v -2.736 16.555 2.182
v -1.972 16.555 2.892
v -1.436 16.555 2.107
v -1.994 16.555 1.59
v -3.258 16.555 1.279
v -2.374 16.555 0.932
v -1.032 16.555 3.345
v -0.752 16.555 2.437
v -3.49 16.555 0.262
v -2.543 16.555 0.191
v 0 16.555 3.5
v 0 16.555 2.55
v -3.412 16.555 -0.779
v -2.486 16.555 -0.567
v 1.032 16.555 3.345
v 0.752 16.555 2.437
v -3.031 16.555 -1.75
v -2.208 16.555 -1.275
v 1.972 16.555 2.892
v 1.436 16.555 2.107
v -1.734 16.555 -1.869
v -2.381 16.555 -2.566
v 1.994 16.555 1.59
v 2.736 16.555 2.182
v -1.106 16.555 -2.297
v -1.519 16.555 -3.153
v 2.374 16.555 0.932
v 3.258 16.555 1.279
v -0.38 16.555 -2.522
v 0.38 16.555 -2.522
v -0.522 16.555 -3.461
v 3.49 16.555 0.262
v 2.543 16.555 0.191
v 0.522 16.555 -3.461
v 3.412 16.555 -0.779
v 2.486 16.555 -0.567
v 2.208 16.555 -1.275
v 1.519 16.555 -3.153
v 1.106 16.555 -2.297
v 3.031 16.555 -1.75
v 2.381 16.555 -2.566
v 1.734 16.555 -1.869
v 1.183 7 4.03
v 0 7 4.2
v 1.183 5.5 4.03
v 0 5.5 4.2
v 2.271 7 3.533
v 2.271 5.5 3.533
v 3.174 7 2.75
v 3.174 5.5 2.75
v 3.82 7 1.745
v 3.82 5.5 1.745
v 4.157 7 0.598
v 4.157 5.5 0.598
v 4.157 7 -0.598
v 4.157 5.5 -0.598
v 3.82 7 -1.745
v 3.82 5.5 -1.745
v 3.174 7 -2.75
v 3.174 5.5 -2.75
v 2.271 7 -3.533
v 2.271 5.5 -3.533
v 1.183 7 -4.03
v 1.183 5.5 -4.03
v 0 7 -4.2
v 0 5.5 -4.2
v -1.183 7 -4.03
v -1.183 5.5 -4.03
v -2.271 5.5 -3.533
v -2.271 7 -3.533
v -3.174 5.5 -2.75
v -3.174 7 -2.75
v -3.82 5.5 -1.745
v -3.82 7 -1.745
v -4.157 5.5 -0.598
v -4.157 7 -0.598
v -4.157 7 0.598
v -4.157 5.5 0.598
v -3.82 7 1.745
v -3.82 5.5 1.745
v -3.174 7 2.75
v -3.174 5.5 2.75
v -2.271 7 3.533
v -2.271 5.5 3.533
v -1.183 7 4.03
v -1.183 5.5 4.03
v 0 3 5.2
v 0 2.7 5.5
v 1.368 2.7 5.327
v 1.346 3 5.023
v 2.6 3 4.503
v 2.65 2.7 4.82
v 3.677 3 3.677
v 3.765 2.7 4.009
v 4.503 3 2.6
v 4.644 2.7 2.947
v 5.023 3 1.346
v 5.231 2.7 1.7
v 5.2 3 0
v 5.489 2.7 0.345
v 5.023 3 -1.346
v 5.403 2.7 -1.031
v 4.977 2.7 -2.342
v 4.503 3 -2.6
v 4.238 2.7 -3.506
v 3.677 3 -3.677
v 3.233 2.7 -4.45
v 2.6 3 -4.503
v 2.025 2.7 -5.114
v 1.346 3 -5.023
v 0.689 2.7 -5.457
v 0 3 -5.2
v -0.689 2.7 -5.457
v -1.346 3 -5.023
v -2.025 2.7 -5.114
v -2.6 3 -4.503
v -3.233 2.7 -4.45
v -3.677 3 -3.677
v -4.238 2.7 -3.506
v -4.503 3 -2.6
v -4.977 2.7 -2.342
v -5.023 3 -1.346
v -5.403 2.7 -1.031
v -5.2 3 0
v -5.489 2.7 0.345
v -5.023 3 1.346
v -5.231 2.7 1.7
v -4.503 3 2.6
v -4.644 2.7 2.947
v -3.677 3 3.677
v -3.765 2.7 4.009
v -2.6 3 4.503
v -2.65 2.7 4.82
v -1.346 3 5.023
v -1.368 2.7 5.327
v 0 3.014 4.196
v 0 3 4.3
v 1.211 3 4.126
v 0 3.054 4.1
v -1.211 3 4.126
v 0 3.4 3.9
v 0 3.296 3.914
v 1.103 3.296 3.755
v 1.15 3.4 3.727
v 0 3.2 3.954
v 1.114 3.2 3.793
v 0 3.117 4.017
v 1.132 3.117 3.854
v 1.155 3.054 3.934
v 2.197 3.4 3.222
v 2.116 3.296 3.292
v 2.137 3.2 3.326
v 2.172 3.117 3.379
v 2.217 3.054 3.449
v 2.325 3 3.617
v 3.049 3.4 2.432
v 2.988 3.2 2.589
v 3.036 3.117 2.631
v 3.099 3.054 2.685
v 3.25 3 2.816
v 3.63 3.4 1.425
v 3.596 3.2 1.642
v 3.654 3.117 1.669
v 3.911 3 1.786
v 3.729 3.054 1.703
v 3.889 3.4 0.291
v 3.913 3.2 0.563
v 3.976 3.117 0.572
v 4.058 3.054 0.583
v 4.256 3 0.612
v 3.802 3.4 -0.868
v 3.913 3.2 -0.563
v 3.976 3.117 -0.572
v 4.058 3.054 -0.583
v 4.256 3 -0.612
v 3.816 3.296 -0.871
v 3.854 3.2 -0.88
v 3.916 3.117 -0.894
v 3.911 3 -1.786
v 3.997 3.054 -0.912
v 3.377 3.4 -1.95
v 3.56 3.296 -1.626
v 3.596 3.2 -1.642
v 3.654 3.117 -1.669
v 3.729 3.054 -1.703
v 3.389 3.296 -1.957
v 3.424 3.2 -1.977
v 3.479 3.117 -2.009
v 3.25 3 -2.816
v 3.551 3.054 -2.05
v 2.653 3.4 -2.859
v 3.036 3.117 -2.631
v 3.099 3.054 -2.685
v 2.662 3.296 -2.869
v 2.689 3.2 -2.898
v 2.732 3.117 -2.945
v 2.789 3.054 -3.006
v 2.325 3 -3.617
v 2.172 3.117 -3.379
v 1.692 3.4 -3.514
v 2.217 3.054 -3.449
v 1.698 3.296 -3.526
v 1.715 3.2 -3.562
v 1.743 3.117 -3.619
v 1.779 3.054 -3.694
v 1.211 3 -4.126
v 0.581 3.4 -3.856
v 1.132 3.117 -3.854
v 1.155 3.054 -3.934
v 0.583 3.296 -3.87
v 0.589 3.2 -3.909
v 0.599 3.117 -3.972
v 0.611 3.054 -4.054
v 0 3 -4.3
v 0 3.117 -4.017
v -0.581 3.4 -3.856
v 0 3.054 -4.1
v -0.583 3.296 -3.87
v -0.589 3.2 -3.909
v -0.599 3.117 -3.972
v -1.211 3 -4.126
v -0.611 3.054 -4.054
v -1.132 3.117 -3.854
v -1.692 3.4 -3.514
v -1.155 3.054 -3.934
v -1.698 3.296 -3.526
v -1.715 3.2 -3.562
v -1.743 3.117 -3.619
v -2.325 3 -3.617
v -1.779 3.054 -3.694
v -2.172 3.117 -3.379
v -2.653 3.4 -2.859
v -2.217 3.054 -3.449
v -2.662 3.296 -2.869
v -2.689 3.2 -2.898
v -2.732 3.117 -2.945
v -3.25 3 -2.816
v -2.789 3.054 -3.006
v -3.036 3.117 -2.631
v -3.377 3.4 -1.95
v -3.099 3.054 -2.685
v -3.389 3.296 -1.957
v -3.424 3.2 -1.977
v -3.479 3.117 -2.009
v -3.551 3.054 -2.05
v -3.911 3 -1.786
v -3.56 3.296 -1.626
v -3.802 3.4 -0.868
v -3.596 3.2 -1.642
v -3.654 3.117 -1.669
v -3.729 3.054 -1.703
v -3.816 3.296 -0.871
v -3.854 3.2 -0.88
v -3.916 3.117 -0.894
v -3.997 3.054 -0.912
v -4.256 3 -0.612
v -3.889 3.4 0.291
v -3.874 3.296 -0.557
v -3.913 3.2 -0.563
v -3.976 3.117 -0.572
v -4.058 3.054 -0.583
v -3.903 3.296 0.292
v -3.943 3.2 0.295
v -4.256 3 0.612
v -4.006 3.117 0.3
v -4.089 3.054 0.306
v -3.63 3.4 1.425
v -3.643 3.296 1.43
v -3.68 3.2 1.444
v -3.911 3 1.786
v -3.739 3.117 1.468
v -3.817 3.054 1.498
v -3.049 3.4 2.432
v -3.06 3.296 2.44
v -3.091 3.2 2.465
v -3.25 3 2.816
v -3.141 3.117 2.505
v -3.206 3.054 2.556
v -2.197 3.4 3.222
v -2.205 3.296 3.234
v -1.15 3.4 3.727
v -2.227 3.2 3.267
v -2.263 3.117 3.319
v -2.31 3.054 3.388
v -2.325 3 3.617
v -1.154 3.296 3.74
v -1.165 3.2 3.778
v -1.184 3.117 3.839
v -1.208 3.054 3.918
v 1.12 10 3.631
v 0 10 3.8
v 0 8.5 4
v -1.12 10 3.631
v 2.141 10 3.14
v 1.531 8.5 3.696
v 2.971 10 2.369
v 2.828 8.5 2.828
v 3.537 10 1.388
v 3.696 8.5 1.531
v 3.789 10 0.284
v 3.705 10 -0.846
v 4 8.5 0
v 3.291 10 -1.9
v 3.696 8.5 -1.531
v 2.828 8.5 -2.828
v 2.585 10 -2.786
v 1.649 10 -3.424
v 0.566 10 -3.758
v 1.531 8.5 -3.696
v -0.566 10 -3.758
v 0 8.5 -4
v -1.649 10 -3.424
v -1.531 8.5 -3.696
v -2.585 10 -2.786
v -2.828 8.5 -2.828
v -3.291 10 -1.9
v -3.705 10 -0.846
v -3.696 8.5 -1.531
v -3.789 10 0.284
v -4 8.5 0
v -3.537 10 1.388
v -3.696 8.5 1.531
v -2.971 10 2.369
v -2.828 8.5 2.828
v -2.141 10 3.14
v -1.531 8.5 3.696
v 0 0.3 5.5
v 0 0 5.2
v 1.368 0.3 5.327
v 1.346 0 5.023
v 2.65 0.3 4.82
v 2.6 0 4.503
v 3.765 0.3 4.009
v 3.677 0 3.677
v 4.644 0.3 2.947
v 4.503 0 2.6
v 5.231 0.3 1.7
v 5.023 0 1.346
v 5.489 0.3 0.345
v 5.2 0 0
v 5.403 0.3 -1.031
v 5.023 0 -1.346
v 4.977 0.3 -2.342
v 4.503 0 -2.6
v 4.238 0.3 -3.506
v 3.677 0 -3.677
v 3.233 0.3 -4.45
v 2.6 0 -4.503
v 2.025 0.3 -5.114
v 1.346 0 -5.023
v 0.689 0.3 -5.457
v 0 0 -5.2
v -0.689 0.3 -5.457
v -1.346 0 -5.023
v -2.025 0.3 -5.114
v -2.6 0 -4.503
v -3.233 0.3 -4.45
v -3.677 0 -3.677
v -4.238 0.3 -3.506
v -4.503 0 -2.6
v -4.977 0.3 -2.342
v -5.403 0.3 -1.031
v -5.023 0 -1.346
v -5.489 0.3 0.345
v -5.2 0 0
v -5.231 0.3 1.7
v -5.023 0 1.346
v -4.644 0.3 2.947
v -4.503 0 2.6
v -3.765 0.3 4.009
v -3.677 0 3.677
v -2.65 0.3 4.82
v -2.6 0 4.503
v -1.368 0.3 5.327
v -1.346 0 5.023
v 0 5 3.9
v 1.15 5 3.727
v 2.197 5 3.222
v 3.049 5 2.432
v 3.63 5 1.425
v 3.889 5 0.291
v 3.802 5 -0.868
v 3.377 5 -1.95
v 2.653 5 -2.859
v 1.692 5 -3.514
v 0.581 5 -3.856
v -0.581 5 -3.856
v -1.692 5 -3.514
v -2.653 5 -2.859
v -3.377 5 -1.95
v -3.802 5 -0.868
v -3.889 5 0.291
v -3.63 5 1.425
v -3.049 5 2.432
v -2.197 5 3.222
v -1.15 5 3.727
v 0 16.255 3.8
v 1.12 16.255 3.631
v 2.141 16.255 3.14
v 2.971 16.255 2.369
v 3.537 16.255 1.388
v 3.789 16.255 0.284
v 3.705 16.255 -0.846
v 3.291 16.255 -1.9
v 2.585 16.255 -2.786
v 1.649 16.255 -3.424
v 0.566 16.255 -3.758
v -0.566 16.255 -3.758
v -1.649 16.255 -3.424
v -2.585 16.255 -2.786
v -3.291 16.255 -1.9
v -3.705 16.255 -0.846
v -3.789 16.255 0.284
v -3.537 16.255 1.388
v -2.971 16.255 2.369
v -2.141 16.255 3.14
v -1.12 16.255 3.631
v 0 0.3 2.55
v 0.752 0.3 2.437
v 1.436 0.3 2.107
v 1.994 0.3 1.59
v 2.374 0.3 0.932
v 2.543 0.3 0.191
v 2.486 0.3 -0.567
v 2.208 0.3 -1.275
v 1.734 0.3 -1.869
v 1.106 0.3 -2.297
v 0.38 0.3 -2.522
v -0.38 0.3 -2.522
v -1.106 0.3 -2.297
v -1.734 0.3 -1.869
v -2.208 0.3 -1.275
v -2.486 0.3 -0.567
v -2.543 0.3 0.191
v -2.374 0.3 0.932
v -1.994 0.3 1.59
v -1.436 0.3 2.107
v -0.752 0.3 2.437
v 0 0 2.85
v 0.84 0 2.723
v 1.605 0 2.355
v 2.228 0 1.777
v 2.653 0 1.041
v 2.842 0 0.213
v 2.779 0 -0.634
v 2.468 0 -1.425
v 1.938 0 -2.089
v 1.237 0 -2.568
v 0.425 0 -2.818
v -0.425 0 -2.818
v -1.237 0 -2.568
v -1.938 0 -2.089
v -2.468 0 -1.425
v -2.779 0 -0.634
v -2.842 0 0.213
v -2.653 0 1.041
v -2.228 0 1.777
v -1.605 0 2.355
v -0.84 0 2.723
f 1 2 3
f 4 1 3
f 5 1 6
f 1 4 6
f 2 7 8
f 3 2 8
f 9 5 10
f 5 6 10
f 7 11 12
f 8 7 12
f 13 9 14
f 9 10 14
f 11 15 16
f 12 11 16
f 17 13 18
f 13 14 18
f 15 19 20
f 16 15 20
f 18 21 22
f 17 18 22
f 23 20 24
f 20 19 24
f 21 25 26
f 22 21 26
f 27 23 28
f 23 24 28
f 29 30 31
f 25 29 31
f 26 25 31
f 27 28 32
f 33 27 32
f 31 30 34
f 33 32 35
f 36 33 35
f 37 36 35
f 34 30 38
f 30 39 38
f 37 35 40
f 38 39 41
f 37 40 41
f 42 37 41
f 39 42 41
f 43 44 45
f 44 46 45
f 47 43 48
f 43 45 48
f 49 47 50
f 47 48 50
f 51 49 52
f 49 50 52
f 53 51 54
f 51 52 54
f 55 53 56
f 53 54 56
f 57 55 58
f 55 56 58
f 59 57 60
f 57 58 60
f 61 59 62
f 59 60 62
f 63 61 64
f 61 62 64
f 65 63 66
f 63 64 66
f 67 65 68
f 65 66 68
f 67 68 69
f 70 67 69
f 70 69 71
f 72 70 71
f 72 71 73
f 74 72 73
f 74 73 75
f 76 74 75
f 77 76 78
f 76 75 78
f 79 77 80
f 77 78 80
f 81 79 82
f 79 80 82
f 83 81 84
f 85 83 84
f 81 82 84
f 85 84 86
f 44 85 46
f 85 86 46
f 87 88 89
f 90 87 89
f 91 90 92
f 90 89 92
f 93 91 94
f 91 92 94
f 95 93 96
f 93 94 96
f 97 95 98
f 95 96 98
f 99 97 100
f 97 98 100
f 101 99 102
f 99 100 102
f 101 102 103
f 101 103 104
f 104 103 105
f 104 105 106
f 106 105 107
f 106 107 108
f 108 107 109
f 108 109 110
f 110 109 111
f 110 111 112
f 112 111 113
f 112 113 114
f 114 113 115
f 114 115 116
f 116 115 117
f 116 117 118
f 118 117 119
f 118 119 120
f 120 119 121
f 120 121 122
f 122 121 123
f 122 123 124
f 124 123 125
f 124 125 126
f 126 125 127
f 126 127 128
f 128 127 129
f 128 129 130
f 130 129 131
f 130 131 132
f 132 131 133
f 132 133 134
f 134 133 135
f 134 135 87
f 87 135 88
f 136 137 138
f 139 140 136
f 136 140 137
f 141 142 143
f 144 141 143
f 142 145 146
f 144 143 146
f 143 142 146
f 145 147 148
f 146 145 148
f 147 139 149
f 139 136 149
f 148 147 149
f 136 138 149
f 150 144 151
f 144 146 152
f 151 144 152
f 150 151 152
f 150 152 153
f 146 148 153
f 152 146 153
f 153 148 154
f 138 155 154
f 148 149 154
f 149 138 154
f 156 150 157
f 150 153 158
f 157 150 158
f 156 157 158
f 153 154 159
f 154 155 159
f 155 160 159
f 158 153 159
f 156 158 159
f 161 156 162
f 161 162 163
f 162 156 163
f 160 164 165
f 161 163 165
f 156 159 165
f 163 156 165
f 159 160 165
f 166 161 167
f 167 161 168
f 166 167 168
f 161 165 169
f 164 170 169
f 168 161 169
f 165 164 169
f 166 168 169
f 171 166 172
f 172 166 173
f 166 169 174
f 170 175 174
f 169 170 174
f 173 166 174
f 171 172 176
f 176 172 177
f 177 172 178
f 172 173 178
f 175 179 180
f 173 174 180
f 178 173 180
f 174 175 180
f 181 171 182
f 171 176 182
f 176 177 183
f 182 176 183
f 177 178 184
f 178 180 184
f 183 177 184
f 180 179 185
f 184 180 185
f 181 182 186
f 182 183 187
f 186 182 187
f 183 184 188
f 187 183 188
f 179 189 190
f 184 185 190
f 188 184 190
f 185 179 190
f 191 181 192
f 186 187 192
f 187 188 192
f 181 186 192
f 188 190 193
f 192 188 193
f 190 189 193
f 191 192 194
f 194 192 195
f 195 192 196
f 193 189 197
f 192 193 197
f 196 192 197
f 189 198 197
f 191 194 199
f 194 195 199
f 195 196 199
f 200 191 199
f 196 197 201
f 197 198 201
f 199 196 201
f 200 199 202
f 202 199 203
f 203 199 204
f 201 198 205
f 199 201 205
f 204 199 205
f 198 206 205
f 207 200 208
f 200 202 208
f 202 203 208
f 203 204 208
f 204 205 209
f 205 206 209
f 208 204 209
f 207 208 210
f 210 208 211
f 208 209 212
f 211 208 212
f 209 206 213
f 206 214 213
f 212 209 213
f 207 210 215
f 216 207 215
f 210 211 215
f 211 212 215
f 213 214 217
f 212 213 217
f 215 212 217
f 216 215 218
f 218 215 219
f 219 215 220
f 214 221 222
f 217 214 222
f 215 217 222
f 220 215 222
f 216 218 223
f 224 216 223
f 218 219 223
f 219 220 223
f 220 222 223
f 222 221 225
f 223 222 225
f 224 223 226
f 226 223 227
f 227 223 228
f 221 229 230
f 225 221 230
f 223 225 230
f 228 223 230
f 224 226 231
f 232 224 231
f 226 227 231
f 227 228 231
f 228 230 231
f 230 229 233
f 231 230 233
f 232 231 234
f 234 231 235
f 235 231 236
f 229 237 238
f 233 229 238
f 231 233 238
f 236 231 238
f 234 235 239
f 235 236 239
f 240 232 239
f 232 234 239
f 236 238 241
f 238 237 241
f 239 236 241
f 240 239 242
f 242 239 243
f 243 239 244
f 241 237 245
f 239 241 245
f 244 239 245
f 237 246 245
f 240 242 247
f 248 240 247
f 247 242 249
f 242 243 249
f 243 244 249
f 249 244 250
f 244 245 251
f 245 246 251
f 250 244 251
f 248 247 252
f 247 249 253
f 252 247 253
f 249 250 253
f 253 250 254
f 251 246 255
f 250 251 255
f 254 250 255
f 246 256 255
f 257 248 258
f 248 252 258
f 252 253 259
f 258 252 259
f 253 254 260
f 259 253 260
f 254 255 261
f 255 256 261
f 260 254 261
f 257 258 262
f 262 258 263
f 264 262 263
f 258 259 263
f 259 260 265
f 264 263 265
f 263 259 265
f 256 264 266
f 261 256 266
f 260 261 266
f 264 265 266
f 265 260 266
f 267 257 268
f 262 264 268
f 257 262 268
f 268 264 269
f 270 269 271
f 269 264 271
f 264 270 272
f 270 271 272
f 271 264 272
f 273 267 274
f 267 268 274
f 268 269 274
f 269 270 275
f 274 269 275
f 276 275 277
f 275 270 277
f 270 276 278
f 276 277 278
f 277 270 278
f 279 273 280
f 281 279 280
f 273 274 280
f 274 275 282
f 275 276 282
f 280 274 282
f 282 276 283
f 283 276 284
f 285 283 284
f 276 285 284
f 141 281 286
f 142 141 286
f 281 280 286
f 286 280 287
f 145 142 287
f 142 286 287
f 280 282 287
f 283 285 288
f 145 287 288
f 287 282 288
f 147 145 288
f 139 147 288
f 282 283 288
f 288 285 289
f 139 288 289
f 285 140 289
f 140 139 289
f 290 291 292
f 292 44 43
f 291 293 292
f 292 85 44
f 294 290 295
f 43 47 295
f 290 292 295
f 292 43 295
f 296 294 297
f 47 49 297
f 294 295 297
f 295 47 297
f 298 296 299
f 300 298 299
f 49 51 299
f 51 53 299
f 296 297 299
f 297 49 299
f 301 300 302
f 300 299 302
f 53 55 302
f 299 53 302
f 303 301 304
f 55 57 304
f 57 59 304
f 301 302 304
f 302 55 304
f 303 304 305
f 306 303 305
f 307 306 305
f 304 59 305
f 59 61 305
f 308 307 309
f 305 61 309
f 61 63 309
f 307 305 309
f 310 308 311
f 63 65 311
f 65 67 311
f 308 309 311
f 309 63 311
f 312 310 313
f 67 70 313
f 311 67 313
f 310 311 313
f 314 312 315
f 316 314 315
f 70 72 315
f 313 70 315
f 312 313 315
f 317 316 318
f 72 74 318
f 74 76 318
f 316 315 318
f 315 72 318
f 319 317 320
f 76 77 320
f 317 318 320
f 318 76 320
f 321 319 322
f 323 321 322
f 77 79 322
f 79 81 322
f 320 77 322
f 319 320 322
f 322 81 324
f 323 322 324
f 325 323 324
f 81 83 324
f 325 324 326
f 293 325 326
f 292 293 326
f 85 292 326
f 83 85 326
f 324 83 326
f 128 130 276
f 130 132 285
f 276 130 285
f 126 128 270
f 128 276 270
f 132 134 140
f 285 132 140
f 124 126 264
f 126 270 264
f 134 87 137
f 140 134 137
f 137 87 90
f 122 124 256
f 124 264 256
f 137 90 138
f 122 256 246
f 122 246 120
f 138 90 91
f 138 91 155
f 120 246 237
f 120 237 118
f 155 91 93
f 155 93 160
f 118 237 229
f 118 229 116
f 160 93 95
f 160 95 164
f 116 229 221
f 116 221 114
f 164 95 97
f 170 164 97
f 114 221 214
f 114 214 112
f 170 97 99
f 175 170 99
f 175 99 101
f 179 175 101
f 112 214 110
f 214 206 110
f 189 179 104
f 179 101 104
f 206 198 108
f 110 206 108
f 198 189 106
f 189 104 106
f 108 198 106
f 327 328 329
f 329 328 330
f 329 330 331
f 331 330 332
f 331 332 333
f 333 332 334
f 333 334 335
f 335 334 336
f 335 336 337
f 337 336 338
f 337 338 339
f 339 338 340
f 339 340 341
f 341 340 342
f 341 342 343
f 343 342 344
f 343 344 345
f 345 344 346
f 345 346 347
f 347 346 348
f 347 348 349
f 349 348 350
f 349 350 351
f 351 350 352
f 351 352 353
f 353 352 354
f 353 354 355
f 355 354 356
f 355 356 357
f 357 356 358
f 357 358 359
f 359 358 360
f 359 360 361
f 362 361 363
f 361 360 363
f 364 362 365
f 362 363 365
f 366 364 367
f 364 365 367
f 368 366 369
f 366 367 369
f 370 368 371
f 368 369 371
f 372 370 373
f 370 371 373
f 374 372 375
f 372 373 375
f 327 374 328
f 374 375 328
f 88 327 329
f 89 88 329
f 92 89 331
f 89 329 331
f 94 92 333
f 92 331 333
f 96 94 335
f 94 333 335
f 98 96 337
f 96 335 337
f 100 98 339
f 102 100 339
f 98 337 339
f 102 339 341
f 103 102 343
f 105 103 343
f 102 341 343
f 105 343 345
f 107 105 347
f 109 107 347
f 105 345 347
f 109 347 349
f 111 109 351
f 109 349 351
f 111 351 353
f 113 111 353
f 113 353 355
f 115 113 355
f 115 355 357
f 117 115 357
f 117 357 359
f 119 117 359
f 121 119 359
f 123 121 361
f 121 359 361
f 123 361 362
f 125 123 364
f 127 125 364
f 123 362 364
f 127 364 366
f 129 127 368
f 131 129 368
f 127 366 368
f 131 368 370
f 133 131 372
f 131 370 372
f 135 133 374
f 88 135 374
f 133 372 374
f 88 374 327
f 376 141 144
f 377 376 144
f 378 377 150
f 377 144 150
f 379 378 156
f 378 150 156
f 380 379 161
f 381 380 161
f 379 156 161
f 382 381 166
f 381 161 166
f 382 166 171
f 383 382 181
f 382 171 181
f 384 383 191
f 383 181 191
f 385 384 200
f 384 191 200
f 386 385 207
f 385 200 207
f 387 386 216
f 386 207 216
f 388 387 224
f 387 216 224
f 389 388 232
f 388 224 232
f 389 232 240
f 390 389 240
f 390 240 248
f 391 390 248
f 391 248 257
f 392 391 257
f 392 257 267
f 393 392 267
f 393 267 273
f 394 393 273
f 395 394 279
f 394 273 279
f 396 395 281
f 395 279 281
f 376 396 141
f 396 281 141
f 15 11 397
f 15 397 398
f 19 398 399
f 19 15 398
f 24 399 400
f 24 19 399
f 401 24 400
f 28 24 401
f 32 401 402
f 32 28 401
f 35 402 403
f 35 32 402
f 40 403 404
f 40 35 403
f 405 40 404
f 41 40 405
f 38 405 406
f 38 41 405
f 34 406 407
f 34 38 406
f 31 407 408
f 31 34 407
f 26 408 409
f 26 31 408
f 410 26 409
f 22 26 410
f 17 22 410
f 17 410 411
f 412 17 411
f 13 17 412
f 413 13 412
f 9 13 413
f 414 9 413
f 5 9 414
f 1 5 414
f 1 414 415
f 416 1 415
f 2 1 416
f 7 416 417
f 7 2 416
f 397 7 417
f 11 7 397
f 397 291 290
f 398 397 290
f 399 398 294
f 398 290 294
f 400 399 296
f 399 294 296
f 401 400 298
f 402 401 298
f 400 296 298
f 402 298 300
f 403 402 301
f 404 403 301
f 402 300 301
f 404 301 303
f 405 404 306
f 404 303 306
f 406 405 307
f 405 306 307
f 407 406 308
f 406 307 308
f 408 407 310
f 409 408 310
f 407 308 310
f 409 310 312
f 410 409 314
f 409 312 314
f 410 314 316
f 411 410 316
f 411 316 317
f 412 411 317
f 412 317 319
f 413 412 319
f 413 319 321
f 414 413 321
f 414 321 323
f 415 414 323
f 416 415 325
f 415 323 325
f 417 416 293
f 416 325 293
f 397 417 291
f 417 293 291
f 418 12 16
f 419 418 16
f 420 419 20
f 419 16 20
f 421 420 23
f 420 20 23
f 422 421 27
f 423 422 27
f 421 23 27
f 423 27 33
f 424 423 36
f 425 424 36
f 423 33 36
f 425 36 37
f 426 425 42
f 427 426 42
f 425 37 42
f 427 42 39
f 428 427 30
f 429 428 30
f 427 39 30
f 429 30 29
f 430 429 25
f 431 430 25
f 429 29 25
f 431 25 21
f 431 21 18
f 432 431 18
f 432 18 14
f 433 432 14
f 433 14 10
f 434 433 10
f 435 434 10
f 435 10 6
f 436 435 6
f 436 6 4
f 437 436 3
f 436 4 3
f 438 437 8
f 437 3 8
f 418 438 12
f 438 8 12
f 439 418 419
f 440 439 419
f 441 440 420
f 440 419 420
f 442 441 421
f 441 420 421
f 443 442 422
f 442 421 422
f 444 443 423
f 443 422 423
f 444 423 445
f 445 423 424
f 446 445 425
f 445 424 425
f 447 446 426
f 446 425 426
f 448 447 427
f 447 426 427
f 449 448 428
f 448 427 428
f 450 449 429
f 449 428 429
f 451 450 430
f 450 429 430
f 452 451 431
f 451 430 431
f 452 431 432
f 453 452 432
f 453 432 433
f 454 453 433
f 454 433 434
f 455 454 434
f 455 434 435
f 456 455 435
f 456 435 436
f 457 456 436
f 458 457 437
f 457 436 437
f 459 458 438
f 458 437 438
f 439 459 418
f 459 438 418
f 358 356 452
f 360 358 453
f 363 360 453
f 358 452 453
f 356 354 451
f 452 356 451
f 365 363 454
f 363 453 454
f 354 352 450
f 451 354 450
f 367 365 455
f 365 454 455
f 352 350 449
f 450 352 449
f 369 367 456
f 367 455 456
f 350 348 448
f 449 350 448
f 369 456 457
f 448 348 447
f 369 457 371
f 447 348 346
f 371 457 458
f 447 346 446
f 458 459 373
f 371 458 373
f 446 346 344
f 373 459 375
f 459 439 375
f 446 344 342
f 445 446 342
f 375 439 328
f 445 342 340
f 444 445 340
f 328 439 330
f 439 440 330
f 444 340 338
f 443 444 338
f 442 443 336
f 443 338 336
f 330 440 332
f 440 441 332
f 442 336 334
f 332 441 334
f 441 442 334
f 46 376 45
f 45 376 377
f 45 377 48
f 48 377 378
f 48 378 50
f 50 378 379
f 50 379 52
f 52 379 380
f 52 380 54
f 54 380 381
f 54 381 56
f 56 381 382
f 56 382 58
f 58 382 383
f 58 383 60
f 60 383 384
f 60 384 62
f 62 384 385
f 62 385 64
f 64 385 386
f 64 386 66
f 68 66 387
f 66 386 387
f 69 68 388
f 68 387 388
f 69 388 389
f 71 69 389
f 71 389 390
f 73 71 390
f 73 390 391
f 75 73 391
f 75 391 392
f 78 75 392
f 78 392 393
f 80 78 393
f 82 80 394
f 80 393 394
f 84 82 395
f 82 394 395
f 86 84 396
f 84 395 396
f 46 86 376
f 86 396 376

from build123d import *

# Parameters (mm, degrees)
F2_R    = 0.4
F3_SIZE = 0.3


with BuildPart() as f1:
    # F0 (on Right) → F1 (revolve)
    with BuildSketch(Plane.YZ):
        Polygon((0, 5.5), (0, 2.55), (16.554633, 2.55), (16.554633, 3.8), (10, 3.8), (7, 4.2), (5.5, 4.2), (5, 3.9), (3, 3.9), (3, 5.5), align=None)
    revolve(axis=Axis((0, 9.707107, 0), (0, 1, 0)))

    # F2
    f2_edges = [f1.edges().sort_by_distance(p)[0] for p in [
        (0, 3, -3.9),
    ]]
    fillet(f2_edges, radius=F2_R)

    # F3
    f3_edges = [f1.edges().sort_by_distance(p)[0] for p in [
        (0, 3, -5.5),
        (0, 0, -5.5),
        (0, 16.554633, -3.8),
        (0, 0, -2.55),
    ]]
    chamfer(f3_edges, length=F3_SIZE)


solid = f1.part
